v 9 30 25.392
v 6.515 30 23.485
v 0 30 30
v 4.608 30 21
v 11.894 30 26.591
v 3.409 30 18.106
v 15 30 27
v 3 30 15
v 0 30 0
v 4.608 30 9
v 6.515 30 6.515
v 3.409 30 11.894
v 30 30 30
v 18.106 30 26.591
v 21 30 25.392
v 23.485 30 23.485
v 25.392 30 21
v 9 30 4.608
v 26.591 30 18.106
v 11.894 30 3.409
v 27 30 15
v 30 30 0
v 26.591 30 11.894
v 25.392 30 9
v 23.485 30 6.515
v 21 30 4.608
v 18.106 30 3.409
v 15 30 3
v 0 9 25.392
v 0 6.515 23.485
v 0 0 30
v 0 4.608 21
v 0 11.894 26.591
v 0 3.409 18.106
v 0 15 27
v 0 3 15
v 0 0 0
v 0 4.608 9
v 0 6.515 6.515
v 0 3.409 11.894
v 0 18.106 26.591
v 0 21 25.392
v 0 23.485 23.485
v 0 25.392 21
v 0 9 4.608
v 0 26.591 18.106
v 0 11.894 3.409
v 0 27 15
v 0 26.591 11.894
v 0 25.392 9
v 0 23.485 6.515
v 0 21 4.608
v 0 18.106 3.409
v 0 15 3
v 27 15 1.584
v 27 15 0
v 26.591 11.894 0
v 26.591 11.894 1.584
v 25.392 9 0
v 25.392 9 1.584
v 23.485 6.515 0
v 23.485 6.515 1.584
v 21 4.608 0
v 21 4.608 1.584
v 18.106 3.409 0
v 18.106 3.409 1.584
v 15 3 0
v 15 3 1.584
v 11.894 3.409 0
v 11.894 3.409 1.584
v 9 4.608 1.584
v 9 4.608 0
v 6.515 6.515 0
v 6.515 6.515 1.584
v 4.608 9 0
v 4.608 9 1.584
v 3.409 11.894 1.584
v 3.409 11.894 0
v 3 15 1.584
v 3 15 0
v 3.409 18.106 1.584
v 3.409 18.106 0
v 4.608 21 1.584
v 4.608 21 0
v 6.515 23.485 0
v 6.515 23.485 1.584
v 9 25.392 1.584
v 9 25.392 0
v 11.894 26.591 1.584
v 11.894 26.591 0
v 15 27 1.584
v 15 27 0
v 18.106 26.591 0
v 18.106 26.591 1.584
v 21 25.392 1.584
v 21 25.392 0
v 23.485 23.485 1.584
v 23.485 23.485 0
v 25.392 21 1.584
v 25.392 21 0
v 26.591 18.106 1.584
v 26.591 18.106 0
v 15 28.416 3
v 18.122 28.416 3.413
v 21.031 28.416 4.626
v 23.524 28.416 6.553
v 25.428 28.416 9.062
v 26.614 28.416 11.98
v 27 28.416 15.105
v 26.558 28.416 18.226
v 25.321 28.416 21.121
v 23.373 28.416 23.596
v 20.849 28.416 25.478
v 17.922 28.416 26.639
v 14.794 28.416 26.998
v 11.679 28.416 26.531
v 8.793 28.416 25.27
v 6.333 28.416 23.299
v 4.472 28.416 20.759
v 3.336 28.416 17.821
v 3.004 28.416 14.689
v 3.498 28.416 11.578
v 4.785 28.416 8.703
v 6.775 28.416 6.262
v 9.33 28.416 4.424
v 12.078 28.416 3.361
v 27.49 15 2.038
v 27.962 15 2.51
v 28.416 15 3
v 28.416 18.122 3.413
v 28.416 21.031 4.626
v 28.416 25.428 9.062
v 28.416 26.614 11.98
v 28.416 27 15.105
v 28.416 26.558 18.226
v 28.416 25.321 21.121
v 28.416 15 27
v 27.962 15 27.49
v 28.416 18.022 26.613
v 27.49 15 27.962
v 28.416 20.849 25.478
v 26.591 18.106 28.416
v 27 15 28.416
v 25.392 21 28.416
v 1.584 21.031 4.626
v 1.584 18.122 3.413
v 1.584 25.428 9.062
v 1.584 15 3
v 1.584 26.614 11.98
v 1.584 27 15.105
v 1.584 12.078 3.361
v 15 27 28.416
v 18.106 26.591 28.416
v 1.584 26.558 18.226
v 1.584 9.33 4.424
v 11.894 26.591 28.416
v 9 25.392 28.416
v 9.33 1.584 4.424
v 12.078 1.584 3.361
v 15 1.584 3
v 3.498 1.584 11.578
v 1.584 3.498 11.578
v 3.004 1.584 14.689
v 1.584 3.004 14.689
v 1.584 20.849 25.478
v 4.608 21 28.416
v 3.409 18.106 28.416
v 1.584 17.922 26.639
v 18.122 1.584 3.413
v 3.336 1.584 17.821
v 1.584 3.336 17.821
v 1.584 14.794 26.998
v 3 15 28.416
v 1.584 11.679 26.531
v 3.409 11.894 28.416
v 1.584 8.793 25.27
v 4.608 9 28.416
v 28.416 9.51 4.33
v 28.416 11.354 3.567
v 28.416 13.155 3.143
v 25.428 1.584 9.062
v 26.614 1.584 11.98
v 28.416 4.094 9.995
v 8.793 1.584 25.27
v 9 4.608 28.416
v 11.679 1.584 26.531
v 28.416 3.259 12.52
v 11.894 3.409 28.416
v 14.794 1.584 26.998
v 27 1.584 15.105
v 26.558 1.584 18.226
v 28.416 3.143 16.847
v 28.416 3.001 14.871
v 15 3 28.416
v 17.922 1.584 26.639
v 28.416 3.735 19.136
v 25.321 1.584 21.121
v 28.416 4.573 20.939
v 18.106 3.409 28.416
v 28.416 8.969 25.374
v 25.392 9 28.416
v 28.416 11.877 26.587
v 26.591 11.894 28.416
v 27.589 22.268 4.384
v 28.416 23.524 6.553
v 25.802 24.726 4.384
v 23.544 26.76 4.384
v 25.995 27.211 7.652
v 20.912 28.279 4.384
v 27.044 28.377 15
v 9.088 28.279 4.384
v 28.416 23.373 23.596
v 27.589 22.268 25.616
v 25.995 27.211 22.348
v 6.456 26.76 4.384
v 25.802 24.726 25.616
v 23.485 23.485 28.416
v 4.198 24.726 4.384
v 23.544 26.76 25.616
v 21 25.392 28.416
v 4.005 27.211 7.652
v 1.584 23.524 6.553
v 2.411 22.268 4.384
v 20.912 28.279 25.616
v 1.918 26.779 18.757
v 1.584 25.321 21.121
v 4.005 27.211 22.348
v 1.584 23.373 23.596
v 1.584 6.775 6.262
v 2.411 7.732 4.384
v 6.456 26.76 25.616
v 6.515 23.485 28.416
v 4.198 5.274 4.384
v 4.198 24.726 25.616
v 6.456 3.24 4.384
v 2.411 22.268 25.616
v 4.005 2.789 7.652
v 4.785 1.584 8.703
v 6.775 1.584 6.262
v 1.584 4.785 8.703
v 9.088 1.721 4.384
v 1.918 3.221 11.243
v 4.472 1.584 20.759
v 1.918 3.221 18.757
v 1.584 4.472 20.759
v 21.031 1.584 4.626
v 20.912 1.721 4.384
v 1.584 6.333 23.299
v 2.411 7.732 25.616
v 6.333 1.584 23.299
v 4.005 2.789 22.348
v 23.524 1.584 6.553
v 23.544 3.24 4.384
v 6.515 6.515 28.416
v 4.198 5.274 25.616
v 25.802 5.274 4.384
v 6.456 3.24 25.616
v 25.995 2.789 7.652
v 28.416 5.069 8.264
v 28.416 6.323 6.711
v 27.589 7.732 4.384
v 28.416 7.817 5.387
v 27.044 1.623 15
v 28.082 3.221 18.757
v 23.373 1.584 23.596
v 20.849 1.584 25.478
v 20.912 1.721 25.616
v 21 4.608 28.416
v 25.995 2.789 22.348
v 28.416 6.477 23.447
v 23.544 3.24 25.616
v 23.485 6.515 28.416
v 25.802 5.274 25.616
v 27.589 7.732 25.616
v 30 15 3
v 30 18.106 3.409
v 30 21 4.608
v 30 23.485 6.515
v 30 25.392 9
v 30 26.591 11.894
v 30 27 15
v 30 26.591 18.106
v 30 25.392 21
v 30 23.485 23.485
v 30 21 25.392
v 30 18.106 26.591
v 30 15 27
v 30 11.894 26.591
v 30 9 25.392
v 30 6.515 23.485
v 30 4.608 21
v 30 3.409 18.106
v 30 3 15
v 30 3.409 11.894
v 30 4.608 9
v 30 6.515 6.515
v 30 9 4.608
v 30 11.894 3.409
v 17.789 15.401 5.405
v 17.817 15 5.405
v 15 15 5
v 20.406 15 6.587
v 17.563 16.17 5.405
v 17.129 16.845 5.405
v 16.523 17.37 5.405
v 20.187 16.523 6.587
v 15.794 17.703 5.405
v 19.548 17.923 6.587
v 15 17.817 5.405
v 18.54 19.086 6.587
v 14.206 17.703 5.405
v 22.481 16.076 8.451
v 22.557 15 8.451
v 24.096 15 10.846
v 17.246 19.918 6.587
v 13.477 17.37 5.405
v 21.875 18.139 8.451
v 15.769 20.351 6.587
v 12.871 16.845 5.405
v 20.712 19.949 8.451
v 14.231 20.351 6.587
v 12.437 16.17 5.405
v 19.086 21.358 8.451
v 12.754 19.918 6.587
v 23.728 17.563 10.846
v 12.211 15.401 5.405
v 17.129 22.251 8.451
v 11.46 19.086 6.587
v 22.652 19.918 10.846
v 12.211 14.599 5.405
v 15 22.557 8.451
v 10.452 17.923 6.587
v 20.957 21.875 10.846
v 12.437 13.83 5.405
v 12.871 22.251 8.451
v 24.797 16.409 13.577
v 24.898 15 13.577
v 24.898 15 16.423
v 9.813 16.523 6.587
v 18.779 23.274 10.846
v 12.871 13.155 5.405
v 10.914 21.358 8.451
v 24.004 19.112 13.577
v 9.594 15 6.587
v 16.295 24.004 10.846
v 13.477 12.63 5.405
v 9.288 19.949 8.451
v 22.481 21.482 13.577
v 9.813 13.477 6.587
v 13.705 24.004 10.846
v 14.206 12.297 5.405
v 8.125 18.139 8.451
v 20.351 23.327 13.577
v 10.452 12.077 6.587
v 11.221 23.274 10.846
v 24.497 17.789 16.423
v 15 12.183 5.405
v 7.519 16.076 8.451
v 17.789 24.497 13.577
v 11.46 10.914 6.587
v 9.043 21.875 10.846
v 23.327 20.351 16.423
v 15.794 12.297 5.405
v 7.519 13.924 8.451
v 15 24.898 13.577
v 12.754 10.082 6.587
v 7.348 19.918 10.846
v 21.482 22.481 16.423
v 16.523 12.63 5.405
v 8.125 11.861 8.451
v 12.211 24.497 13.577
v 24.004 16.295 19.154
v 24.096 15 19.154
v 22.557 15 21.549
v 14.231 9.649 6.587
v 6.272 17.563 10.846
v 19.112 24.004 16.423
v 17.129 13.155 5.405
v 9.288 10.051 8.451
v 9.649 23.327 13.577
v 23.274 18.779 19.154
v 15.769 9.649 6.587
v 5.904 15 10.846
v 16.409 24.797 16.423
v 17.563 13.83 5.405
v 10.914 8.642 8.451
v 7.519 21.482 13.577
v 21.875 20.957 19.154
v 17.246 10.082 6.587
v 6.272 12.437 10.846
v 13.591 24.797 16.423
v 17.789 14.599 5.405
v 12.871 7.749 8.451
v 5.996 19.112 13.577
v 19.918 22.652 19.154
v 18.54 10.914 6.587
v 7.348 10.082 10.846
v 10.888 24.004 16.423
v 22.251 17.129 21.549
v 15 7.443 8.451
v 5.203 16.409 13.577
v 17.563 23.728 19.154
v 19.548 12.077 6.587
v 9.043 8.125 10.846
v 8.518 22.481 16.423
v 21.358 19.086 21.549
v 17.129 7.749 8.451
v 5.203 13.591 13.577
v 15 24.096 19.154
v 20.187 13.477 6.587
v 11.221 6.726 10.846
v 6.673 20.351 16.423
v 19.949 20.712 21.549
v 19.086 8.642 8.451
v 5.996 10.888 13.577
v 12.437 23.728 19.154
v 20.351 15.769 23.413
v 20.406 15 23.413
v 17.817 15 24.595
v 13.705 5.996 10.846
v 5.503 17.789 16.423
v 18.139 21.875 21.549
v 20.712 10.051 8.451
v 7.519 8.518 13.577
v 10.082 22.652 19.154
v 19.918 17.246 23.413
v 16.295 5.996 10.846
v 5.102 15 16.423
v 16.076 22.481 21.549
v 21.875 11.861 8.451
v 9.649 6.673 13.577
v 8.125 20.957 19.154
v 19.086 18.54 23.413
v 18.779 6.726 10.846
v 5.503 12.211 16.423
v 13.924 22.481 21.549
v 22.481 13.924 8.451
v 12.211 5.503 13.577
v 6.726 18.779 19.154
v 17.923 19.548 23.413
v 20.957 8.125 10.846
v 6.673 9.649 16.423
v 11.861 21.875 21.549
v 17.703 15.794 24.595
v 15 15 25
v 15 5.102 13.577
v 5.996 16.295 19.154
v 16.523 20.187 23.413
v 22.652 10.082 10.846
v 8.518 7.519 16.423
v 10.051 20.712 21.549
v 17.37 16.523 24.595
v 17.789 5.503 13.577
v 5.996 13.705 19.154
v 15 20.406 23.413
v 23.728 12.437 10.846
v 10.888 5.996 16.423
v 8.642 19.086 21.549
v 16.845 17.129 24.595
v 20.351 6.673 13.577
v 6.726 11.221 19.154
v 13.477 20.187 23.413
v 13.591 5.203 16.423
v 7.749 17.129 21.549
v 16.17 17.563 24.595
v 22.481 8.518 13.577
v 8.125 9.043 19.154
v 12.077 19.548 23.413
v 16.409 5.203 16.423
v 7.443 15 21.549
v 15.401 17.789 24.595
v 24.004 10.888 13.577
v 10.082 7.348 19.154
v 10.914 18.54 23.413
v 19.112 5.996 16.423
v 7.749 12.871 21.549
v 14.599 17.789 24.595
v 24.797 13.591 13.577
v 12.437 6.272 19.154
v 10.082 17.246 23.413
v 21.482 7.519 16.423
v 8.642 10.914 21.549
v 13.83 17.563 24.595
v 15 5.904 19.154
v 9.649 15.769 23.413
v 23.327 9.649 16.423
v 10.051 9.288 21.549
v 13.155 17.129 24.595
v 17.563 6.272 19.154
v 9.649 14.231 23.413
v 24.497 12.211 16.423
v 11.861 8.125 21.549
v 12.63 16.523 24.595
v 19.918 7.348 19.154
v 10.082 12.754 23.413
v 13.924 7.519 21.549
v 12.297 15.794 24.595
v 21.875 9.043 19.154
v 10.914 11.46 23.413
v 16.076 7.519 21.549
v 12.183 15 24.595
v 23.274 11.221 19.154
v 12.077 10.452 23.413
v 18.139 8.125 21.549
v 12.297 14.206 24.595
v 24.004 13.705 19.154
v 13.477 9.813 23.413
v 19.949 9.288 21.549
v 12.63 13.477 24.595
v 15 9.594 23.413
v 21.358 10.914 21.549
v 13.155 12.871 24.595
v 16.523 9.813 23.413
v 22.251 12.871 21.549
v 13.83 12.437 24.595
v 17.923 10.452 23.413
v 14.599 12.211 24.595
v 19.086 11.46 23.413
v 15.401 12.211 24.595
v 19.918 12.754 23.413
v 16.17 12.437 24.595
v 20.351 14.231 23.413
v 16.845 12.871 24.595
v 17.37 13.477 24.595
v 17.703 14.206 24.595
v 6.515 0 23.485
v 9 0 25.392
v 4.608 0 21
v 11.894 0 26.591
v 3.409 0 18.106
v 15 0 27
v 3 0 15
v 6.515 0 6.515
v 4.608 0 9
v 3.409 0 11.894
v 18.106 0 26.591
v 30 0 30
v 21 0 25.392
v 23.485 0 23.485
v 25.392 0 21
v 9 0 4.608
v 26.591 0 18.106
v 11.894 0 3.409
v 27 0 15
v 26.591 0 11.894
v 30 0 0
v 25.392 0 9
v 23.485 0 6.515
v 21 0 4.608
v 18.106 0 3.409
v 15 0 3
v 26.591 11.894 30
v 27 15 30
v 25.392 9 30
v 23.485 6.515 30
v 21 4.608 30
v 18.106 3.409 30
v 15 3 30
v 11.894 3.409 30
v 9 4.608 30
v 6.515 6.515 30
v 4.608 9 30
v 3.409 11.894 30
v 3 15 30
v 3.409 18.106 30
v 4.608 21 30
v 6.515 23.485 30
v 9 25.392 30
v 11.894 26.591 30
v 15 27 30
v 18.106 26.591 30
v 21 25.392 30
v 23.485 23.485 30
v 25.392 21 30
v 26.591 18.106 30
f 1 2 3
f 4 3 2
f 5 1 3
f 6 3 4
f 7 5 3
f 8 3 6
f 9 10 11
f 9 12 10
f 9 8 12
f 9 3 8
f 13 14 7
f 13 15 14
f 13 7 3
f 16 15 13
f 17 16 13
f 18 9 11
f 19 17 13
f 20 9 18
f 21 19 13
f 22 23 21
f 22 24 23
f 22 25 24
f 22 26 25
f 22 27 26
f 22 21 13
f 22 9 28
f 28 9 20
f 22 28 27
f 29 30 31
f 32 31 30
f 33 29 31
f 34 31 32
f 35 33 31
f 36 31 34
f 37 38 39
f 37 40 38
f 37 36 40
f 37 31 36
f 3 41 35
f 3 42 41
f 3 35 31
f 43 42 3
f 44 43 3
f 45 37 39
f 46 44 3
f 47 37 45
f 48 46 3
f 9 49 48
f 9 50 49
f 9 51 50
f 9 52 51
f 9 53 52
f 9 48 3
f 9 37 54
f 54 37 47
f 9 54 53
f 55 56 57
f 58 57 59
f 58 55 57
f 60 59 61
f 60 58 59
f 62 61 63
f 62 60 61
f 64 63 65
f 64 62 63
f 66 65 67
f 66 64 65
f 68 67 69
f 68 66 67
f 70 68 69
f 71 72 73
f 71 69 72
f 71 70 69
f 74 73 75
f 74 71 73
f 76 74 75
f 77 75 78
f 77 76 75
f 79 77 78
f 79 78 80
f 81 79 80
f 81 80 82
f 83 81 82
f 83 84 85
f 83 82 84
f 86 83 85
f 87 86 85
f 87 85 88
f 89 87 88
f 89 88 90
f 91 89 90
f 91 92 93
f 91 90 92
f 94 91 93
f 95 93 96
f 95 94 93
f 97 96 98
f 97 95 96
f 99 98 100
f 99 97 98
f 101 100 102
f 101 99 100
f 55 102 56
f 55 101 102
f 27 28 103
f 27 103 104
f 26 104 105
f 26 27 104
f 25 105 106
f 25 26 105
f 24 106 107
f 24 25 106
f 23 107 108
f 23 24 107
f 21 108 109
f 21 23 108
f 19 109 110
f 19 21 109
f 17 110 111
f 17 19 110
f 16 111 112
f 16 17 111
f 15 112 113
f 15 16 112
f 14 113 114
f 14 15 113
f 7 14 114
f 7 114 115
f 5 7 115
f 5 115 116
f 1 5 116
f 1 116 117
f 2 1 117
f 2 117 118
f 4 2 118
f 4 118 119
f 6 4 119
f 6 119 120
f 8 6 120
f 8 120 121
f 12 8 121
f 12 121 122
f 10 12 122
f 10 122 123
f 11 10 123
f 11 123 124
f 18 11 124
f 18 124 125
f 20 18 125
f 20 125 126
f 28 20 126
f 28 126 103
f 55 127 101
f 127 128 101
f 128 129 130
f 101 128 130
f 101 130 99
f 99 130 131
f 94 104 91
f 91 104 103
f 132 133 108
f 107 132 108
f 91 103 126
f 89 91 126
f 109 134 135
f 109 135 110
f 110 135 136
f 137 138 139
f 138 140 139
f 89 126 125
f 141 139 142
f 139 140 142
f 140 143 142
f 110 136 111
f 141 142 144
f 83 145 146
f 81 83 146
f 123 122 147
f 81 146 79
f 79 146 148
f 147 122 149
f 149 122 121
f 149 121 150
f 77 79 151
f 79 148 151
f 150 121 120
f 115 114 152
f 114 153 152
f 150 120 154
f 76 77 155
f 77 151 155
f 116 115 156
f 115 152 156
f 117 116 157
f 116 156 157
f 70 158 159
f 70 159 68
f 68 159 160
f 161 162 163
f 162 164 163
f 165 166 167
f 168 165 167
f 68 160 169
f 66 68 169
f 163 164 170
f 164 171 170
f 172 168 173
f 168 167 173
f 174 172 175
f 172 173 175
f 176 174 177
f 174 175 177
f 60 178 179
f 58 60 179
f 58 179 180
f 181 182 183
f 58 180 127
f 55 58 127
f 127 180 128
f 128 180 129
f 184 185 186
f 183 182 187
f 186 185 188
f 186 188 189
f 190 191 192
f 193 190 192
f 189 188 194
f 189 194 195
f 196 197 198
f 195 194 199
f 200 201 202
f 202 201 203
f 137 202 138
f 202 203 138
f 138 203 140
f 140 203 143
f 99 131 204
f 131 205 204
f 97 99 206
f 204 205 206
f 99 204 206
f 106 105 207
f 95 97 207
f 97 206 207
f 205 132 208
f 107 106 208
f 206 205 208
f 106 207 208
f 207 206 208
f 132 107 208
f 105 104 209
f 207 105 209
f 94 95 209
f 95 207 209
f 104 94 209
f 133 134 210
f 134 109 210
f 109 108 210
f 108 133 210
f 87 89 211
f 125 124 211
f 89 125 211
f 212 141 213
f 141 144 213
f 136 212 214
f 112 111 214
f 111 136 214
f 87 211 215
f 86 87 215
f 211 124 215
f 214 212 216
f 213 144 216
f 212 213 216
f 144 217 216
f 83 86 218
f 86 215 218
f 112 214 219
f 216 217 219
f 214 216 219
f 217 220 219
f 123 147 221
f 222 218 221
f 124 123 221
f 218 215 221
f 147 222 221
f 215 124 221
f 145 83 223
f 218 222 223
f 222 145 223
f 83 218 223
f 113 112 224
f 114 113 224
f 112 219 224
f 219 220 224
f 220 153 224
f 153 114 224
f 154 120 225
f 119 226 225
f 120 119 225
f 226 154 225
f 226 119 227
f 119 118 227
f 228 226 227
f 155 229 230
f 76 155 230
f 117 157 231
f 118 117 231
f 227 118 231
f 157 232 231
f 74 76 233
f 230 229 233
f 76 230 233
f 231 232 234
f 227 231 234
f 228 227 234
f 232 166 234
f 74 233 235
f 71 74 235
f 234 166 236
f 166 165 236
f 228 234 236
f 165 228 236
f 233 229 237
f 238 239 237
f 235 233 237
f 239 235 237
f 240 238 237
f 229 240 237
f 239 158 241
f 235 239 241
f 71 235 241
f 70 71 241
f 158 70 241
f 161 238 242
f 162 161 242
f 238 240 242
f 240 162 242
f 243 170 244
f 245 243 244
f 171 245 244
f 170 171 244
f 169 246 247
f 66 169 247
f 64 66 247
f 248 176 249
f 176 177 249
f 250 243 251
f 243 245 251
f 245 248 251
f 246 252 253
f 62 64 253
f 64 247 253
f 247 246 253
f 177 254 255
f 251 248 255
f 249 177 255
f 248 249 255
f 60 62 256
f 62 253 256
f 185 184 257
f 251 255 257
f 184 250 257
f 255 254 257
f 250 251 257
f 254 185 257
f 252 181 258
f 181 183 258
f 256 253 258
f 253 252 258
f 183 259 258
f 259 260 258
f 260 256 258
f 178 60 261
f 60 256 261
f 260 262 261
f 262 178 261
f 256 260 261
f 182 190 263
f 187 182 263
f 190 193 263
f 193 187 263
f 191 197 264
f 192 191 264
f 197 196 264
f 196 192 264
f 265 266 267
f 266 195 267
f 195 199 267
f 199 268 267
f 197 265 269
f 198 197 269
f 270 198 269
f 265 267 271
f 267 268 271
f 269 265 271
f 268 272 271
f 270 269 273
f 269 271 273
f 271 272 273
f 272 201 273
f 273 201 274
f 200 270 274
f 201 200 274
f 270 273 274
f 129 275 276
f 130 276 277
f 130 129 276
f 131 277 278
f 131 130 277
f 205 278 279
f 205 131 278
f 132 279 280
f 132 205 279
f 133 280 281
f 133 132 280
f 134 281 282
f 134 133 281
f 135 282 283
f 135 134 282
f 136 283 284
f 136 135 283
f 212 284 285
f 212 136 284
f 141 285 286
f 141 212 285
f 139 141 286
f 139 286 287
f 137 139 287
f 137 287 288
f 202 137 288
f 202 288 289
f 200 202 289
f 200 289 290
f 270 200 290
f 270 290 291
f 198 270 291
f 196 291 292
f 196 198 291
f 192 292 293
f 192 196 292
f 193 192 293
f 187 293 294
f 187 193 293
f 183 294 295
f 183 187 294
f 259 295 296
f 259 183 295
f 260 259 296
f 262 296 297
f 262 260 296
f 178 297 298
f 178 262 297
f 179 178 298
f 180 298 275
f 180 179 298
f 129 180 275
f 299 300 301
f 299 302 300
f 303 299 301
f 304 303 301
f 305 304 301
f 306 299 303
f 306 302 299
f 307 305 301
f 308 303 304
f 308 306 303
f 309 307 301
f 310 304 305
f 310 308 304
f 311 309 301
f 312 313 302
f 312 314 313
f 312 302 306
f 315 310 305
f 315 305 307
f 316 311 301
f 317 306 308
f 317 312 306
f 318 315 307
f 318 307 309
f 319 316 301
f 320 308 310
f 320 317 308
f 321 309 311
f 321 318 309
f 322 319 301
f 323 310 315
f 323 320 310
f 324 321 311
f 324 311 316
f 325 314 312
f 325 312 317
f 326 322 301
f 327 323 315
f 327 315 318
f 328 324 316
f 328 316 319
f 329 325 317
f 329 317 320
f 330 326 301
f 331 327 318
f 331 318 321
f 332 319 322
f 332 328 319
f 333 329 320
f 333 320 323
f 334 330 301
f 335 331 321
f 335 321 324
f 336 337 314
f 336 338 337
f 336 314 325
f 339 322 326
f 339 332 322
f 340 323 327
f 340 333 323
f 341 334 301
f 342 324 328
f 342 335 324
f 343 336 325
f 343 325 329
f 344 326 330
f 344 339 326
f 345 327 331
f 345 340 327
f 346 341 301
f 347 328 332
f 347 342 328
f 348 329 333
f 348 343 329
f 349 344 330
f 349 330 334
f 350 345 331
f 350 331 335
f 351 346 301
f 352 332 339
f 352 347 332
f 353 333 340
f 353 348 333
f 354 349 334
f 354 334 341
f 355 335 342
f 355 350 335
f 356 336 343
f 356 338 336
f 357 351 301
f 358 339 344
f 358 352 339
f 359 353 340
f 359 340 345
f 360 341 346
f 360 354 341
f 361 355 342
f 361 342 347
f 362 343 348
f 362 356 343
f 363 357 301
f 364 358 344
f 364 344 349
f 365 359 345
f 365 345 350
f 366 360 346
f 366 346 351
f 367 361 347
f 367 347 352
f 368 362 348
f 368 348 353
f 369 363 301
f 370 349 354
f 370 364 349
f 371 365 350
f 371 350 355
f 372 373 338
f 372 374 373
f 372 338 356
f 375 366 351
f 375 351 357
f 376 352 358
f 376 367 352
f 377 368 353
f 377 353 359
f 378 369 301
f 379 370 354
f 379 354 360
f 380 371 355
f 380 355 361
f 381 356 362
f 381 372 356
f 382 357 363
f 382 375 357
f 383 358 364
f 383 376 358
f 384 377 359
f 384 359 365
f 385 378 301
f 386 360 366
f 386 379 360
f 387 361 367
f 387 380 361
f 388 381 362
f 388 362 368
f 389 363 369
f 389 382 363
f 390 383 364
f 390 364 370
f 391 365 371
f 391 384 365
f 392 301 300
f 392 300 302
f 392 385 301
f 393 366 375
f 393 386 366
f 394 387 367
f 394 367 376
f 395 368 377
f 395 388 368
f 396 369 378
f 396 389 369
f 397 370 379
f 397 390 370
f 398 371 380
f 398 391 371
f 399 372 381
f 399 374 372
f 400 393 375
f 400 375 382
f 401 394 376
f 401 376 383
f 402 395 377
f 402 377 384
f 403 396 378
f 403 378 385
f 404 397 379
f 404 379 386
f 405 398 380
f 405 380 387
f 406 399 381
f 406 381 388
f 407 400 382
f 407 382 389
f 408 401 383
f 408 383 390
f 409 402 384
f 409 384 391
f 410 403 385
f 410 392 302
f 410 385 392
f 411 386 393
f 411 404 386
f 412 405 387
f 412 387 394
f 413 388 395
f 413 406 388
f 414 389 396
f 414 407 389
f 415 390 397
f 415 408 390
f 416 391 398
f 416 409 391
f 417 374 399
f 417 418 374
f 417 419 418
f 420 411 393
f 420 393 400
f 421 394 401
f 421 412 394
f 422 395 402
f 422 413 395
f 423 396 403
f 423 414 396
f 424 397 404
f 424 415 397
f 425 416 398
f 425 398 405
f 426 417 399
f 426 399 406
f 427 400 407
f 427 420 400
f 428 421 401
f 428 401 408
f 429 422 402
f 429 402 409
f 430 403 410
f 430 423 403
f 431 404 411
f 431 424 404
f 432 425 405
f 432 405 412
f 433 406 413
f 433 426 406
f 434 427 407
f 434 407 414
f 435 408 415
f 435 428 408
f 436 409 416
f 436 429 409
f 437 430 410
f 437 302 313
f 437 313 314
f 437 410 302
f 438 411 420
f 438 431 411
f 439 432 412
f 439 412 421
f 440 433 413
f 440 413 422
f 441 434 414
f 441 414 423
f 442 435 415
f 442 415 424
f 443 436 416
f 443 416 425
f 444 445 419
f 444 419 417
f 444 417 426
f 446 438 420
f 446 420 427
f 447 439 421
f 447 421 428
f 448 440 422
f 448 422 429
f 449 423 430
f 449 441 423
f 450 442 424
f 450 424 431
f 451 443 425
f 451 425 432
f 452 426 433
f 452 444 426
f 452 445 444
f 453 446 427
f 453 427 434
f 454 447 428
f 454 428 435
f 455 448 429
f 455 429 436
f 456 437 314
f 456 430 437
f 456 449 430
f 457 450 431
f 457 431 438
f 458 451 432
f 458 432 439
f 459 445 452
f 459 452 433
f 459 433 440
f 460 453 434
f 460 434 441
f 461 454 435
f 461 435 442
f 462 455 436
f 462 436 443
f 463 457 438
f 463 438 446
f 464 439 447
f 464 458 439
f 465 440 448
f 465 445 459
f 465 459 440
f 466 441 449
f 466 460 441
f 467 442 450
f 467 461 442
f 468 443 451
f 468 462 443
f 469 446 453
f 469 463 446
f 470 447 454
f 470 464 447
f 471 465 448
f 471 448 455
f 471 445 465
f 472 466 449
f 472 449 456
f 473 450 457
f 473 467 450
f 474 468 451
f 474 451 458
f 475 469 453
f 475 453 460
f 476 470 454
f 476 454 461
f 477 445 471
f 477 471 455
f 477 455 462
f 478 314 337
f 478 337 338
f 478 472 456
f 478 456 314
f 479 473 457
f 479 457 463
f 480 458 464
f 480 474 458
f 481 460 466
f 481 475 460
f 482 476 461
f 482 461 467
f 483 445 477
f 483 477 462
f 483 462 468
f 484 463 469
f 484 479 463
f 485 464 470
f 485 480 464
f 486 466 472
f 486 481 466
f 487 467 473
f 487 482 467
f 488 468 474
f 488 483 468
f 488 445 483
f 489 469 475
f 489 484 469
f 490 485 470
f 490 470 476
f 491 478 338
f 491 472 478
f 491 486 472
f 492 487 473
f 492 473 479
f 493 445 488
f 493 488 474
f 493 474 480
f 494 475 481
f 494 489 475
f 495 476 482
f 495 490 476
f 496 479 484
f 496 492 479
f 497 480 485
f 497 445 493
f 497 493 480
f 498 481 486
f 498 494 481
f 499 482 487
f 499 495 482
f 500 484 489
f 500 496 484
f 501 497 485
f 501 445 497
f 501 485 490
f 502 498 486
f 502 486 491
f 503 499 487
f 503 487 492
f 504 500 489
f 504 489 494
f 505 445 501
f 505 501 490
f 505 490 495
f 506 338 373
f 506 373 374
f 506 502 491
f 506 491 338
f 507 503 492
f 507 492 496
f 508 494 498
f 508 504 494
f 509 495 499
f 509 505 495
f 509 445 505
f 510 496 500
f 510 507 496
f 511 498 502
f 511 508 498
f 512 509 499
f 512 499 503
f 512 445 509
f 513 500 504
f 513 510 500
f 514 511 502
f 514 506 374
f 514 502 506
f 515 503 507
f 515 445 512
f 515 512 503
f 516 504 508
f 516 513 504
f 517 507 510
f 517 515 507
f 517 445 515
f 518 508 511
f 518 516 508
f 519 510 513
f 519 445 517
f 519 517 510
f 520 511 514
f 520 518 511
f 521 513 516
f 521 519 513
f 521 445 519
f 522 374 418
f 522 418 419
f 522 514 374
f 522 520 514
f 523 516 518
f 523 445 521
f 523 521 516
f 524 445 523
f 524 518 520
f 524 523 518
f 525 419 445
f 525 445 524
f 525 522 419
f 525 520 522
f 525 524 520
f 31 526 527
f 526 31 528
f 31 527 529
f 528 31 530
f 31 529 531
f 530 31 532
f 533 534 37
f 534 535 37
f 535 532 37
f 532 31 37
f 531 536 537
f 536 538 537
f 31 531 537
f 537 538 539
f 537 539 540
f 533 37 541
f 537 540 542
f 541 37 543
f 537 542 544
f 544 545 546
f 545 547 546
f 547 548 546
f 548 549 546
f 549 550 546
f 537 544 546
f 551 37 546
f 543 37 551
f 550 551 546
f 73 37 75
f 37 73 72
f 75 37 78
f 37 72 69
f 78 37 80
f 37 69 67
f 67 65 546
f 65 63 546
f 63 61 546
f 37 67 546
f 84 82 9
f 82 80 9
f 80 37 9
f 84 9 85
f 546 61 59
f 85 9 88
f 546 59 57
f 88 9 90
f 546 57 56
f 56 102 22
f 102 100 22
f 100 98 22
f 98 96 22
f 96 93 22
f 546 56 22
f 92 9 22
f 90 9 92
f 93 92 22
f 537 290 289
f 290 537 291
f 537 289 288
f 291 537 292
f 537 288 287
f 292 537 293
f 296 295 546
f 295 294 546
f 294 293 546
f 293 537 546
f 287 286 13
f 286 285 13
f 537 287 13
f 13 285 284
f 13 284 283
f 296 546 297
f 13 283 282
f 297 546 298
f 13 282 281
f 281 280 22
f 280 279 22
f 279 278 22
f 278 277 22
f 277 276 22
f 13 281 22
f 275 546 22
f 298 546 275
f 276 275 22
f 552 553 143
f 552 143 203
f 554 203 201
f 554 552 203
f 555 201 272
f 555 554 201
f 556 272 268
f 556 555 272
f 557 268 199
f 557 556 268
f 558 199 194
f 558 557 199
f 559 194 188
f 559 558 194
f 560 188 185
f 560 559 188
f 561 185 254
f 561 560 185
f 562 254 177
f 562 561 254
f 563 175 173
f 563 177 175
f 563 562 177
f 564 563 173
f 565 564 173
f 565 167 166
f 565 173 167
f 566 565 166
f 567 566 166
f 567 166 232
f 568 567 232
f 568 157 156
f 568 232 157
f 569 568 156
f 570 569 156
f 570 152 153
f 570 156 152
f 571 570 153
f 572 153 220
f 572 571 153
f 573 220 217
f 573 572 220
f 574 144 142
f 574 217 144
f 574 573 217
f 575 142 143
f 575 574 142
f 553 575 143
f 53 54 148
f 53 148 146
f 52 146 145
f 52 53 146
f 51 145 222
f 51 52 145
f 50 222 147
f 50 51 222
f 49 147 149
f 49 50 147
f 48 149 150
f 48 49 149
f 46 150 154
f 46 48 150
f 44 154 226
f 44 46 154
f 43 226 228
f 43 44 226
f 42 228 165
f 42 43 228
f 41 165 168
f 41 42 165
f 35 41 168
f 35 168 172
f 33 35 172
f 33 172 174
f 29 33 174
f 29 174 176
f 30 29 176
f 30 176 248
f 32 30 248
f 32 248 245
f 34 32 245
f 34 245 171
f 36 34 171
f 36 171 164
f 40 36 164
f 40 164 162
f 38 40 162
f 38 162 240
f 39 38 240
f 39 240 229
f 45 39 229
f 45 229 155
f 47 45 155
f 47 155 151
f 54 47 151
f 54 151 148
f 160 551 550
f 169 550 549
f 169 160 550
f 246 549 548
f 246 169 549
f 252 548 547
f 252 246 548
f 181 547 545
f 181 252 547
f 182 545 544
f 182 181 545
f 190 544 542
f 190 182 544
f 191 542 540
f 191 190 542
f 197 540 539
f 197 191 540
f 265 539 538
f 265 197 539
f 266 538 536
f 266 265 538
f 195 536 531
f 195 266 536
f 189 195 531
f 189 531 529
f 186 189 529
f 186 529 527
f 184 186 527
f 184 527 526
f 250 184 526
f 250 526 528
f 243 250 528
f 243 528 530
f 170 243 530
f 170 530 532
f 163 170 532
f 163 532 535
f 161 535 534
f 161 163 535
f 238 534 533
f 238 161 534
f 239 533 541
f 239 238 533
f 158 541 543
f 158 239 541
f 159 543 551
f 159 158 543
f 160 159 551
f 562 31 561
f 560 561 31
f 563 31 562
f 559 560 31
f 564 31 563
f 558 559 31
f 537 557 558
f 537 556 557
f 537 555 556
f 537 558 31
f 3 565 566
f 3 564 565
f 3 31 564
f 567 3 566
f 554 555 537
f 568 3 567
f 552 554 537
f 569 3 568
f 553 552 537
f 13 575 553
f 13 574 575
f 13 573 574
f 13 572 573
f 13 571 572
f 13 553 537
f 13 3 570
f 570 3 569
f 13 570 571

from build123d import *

# Parameters (mm, degrees)
CYLINDER001_R     = 12
CYLINDER001_DEPTH = 36
CYLINDER002_R     = 12
CYLINDER002_DEPTH = 36
CYLINDER_R        = 12
CYLINDER_DEPTH    = 36
BOX_W             = 30
BOX_H             = 30
BOX_DEPTH         = 30


with BuildPart() as esfera_per_restar:
    # Sphere → Sphere (revolve)
    with BuildSketch(Plane(origin=(15, 15, 15), x_dir=(1, 0, 0), z_dir=(0, -1, 0))):
        with BuildLine():
            ThreePointArc((0, -18), (18, 0), (0, 18))
            Line((0, 18), (0, -18))
        make_face()
    revolve(axis=Axis((15, 15, 15), (0, 0, 1)))


with BuildPart() as cylinder001:
    # Cylinder001 → Cylinder001 (new body)
    with BuildSketch(Plane(origin=(15, 33, 15), x_dir=(0, 0, -1), z_dir=(0, -1, 0))):
        Circle(CYLINDER001_R)
    extrude(amount=CYLINDER001_DEPTH)


with BuildPart() as cylinder002:
    # Cylinder002 → Cylinder002 (new body)
    with BuildSketch(Plane(origin=(15, 15, 33), x_dir=(1, 0, 0), z_dir=(0, 0, -1))):
        Circle(CYLINDER002_R)
    extrude(amount=CYLINDER002_DEPTH)


with BuildPart() as uni_dels_tres_cilindres:
    # Cylinder → Cylinder (new body)
    with BuildSketch(Plane(origin=(-3, 15, 15), x_dir=(0, 0, -1), z_dir=(1, 0, 0))):
        Circle(CYLINDER_R)
    extrude(amount=CYLINDER_DEPTH)

    # Fusion: union Cylinder001, Cylinder002
    add(cylinder001.part)
    add(cylinder002.part)


with BuildPart() as cub_amb_esfera_ja_restada:
    # Box → Box (new body)
    with BuildSketch(Plane.XY):
        with Locations((15, 15)):
            Rectangle(BOX_W, BOX_H)
    extrude(amount=BOX_DEPTH)

    # Cut: cut Unió_dels_tres_cilindres
    add(uni_dels_tres_cilindres.part, mode=Mode.SUBTRACT)

    # Cut001: cut Esfera_per_restar
    add(esfera_per_restar.part, mode=Mode.SUBTRACT)


with BuildPart() as esfera_interior:
    # Sphere001 → Sphere001 (revolve)
    with BuildSketch(Plane(origin=(15, 15, 15), x_dir=(1, 0, 0), z_dir=(0, -1, 0))):
        with BuildLine():
            ThreePointArc((0, -10), (10, 0), (0, 10))
            Line((0, 10), (0, -10))
        make_face()
    revolve(axis=Axis((15, 15, 15), (0, 0, 1)))


solid = Compound([cub_amb_esfera_ja_restada.part, esfera_interior.part])
